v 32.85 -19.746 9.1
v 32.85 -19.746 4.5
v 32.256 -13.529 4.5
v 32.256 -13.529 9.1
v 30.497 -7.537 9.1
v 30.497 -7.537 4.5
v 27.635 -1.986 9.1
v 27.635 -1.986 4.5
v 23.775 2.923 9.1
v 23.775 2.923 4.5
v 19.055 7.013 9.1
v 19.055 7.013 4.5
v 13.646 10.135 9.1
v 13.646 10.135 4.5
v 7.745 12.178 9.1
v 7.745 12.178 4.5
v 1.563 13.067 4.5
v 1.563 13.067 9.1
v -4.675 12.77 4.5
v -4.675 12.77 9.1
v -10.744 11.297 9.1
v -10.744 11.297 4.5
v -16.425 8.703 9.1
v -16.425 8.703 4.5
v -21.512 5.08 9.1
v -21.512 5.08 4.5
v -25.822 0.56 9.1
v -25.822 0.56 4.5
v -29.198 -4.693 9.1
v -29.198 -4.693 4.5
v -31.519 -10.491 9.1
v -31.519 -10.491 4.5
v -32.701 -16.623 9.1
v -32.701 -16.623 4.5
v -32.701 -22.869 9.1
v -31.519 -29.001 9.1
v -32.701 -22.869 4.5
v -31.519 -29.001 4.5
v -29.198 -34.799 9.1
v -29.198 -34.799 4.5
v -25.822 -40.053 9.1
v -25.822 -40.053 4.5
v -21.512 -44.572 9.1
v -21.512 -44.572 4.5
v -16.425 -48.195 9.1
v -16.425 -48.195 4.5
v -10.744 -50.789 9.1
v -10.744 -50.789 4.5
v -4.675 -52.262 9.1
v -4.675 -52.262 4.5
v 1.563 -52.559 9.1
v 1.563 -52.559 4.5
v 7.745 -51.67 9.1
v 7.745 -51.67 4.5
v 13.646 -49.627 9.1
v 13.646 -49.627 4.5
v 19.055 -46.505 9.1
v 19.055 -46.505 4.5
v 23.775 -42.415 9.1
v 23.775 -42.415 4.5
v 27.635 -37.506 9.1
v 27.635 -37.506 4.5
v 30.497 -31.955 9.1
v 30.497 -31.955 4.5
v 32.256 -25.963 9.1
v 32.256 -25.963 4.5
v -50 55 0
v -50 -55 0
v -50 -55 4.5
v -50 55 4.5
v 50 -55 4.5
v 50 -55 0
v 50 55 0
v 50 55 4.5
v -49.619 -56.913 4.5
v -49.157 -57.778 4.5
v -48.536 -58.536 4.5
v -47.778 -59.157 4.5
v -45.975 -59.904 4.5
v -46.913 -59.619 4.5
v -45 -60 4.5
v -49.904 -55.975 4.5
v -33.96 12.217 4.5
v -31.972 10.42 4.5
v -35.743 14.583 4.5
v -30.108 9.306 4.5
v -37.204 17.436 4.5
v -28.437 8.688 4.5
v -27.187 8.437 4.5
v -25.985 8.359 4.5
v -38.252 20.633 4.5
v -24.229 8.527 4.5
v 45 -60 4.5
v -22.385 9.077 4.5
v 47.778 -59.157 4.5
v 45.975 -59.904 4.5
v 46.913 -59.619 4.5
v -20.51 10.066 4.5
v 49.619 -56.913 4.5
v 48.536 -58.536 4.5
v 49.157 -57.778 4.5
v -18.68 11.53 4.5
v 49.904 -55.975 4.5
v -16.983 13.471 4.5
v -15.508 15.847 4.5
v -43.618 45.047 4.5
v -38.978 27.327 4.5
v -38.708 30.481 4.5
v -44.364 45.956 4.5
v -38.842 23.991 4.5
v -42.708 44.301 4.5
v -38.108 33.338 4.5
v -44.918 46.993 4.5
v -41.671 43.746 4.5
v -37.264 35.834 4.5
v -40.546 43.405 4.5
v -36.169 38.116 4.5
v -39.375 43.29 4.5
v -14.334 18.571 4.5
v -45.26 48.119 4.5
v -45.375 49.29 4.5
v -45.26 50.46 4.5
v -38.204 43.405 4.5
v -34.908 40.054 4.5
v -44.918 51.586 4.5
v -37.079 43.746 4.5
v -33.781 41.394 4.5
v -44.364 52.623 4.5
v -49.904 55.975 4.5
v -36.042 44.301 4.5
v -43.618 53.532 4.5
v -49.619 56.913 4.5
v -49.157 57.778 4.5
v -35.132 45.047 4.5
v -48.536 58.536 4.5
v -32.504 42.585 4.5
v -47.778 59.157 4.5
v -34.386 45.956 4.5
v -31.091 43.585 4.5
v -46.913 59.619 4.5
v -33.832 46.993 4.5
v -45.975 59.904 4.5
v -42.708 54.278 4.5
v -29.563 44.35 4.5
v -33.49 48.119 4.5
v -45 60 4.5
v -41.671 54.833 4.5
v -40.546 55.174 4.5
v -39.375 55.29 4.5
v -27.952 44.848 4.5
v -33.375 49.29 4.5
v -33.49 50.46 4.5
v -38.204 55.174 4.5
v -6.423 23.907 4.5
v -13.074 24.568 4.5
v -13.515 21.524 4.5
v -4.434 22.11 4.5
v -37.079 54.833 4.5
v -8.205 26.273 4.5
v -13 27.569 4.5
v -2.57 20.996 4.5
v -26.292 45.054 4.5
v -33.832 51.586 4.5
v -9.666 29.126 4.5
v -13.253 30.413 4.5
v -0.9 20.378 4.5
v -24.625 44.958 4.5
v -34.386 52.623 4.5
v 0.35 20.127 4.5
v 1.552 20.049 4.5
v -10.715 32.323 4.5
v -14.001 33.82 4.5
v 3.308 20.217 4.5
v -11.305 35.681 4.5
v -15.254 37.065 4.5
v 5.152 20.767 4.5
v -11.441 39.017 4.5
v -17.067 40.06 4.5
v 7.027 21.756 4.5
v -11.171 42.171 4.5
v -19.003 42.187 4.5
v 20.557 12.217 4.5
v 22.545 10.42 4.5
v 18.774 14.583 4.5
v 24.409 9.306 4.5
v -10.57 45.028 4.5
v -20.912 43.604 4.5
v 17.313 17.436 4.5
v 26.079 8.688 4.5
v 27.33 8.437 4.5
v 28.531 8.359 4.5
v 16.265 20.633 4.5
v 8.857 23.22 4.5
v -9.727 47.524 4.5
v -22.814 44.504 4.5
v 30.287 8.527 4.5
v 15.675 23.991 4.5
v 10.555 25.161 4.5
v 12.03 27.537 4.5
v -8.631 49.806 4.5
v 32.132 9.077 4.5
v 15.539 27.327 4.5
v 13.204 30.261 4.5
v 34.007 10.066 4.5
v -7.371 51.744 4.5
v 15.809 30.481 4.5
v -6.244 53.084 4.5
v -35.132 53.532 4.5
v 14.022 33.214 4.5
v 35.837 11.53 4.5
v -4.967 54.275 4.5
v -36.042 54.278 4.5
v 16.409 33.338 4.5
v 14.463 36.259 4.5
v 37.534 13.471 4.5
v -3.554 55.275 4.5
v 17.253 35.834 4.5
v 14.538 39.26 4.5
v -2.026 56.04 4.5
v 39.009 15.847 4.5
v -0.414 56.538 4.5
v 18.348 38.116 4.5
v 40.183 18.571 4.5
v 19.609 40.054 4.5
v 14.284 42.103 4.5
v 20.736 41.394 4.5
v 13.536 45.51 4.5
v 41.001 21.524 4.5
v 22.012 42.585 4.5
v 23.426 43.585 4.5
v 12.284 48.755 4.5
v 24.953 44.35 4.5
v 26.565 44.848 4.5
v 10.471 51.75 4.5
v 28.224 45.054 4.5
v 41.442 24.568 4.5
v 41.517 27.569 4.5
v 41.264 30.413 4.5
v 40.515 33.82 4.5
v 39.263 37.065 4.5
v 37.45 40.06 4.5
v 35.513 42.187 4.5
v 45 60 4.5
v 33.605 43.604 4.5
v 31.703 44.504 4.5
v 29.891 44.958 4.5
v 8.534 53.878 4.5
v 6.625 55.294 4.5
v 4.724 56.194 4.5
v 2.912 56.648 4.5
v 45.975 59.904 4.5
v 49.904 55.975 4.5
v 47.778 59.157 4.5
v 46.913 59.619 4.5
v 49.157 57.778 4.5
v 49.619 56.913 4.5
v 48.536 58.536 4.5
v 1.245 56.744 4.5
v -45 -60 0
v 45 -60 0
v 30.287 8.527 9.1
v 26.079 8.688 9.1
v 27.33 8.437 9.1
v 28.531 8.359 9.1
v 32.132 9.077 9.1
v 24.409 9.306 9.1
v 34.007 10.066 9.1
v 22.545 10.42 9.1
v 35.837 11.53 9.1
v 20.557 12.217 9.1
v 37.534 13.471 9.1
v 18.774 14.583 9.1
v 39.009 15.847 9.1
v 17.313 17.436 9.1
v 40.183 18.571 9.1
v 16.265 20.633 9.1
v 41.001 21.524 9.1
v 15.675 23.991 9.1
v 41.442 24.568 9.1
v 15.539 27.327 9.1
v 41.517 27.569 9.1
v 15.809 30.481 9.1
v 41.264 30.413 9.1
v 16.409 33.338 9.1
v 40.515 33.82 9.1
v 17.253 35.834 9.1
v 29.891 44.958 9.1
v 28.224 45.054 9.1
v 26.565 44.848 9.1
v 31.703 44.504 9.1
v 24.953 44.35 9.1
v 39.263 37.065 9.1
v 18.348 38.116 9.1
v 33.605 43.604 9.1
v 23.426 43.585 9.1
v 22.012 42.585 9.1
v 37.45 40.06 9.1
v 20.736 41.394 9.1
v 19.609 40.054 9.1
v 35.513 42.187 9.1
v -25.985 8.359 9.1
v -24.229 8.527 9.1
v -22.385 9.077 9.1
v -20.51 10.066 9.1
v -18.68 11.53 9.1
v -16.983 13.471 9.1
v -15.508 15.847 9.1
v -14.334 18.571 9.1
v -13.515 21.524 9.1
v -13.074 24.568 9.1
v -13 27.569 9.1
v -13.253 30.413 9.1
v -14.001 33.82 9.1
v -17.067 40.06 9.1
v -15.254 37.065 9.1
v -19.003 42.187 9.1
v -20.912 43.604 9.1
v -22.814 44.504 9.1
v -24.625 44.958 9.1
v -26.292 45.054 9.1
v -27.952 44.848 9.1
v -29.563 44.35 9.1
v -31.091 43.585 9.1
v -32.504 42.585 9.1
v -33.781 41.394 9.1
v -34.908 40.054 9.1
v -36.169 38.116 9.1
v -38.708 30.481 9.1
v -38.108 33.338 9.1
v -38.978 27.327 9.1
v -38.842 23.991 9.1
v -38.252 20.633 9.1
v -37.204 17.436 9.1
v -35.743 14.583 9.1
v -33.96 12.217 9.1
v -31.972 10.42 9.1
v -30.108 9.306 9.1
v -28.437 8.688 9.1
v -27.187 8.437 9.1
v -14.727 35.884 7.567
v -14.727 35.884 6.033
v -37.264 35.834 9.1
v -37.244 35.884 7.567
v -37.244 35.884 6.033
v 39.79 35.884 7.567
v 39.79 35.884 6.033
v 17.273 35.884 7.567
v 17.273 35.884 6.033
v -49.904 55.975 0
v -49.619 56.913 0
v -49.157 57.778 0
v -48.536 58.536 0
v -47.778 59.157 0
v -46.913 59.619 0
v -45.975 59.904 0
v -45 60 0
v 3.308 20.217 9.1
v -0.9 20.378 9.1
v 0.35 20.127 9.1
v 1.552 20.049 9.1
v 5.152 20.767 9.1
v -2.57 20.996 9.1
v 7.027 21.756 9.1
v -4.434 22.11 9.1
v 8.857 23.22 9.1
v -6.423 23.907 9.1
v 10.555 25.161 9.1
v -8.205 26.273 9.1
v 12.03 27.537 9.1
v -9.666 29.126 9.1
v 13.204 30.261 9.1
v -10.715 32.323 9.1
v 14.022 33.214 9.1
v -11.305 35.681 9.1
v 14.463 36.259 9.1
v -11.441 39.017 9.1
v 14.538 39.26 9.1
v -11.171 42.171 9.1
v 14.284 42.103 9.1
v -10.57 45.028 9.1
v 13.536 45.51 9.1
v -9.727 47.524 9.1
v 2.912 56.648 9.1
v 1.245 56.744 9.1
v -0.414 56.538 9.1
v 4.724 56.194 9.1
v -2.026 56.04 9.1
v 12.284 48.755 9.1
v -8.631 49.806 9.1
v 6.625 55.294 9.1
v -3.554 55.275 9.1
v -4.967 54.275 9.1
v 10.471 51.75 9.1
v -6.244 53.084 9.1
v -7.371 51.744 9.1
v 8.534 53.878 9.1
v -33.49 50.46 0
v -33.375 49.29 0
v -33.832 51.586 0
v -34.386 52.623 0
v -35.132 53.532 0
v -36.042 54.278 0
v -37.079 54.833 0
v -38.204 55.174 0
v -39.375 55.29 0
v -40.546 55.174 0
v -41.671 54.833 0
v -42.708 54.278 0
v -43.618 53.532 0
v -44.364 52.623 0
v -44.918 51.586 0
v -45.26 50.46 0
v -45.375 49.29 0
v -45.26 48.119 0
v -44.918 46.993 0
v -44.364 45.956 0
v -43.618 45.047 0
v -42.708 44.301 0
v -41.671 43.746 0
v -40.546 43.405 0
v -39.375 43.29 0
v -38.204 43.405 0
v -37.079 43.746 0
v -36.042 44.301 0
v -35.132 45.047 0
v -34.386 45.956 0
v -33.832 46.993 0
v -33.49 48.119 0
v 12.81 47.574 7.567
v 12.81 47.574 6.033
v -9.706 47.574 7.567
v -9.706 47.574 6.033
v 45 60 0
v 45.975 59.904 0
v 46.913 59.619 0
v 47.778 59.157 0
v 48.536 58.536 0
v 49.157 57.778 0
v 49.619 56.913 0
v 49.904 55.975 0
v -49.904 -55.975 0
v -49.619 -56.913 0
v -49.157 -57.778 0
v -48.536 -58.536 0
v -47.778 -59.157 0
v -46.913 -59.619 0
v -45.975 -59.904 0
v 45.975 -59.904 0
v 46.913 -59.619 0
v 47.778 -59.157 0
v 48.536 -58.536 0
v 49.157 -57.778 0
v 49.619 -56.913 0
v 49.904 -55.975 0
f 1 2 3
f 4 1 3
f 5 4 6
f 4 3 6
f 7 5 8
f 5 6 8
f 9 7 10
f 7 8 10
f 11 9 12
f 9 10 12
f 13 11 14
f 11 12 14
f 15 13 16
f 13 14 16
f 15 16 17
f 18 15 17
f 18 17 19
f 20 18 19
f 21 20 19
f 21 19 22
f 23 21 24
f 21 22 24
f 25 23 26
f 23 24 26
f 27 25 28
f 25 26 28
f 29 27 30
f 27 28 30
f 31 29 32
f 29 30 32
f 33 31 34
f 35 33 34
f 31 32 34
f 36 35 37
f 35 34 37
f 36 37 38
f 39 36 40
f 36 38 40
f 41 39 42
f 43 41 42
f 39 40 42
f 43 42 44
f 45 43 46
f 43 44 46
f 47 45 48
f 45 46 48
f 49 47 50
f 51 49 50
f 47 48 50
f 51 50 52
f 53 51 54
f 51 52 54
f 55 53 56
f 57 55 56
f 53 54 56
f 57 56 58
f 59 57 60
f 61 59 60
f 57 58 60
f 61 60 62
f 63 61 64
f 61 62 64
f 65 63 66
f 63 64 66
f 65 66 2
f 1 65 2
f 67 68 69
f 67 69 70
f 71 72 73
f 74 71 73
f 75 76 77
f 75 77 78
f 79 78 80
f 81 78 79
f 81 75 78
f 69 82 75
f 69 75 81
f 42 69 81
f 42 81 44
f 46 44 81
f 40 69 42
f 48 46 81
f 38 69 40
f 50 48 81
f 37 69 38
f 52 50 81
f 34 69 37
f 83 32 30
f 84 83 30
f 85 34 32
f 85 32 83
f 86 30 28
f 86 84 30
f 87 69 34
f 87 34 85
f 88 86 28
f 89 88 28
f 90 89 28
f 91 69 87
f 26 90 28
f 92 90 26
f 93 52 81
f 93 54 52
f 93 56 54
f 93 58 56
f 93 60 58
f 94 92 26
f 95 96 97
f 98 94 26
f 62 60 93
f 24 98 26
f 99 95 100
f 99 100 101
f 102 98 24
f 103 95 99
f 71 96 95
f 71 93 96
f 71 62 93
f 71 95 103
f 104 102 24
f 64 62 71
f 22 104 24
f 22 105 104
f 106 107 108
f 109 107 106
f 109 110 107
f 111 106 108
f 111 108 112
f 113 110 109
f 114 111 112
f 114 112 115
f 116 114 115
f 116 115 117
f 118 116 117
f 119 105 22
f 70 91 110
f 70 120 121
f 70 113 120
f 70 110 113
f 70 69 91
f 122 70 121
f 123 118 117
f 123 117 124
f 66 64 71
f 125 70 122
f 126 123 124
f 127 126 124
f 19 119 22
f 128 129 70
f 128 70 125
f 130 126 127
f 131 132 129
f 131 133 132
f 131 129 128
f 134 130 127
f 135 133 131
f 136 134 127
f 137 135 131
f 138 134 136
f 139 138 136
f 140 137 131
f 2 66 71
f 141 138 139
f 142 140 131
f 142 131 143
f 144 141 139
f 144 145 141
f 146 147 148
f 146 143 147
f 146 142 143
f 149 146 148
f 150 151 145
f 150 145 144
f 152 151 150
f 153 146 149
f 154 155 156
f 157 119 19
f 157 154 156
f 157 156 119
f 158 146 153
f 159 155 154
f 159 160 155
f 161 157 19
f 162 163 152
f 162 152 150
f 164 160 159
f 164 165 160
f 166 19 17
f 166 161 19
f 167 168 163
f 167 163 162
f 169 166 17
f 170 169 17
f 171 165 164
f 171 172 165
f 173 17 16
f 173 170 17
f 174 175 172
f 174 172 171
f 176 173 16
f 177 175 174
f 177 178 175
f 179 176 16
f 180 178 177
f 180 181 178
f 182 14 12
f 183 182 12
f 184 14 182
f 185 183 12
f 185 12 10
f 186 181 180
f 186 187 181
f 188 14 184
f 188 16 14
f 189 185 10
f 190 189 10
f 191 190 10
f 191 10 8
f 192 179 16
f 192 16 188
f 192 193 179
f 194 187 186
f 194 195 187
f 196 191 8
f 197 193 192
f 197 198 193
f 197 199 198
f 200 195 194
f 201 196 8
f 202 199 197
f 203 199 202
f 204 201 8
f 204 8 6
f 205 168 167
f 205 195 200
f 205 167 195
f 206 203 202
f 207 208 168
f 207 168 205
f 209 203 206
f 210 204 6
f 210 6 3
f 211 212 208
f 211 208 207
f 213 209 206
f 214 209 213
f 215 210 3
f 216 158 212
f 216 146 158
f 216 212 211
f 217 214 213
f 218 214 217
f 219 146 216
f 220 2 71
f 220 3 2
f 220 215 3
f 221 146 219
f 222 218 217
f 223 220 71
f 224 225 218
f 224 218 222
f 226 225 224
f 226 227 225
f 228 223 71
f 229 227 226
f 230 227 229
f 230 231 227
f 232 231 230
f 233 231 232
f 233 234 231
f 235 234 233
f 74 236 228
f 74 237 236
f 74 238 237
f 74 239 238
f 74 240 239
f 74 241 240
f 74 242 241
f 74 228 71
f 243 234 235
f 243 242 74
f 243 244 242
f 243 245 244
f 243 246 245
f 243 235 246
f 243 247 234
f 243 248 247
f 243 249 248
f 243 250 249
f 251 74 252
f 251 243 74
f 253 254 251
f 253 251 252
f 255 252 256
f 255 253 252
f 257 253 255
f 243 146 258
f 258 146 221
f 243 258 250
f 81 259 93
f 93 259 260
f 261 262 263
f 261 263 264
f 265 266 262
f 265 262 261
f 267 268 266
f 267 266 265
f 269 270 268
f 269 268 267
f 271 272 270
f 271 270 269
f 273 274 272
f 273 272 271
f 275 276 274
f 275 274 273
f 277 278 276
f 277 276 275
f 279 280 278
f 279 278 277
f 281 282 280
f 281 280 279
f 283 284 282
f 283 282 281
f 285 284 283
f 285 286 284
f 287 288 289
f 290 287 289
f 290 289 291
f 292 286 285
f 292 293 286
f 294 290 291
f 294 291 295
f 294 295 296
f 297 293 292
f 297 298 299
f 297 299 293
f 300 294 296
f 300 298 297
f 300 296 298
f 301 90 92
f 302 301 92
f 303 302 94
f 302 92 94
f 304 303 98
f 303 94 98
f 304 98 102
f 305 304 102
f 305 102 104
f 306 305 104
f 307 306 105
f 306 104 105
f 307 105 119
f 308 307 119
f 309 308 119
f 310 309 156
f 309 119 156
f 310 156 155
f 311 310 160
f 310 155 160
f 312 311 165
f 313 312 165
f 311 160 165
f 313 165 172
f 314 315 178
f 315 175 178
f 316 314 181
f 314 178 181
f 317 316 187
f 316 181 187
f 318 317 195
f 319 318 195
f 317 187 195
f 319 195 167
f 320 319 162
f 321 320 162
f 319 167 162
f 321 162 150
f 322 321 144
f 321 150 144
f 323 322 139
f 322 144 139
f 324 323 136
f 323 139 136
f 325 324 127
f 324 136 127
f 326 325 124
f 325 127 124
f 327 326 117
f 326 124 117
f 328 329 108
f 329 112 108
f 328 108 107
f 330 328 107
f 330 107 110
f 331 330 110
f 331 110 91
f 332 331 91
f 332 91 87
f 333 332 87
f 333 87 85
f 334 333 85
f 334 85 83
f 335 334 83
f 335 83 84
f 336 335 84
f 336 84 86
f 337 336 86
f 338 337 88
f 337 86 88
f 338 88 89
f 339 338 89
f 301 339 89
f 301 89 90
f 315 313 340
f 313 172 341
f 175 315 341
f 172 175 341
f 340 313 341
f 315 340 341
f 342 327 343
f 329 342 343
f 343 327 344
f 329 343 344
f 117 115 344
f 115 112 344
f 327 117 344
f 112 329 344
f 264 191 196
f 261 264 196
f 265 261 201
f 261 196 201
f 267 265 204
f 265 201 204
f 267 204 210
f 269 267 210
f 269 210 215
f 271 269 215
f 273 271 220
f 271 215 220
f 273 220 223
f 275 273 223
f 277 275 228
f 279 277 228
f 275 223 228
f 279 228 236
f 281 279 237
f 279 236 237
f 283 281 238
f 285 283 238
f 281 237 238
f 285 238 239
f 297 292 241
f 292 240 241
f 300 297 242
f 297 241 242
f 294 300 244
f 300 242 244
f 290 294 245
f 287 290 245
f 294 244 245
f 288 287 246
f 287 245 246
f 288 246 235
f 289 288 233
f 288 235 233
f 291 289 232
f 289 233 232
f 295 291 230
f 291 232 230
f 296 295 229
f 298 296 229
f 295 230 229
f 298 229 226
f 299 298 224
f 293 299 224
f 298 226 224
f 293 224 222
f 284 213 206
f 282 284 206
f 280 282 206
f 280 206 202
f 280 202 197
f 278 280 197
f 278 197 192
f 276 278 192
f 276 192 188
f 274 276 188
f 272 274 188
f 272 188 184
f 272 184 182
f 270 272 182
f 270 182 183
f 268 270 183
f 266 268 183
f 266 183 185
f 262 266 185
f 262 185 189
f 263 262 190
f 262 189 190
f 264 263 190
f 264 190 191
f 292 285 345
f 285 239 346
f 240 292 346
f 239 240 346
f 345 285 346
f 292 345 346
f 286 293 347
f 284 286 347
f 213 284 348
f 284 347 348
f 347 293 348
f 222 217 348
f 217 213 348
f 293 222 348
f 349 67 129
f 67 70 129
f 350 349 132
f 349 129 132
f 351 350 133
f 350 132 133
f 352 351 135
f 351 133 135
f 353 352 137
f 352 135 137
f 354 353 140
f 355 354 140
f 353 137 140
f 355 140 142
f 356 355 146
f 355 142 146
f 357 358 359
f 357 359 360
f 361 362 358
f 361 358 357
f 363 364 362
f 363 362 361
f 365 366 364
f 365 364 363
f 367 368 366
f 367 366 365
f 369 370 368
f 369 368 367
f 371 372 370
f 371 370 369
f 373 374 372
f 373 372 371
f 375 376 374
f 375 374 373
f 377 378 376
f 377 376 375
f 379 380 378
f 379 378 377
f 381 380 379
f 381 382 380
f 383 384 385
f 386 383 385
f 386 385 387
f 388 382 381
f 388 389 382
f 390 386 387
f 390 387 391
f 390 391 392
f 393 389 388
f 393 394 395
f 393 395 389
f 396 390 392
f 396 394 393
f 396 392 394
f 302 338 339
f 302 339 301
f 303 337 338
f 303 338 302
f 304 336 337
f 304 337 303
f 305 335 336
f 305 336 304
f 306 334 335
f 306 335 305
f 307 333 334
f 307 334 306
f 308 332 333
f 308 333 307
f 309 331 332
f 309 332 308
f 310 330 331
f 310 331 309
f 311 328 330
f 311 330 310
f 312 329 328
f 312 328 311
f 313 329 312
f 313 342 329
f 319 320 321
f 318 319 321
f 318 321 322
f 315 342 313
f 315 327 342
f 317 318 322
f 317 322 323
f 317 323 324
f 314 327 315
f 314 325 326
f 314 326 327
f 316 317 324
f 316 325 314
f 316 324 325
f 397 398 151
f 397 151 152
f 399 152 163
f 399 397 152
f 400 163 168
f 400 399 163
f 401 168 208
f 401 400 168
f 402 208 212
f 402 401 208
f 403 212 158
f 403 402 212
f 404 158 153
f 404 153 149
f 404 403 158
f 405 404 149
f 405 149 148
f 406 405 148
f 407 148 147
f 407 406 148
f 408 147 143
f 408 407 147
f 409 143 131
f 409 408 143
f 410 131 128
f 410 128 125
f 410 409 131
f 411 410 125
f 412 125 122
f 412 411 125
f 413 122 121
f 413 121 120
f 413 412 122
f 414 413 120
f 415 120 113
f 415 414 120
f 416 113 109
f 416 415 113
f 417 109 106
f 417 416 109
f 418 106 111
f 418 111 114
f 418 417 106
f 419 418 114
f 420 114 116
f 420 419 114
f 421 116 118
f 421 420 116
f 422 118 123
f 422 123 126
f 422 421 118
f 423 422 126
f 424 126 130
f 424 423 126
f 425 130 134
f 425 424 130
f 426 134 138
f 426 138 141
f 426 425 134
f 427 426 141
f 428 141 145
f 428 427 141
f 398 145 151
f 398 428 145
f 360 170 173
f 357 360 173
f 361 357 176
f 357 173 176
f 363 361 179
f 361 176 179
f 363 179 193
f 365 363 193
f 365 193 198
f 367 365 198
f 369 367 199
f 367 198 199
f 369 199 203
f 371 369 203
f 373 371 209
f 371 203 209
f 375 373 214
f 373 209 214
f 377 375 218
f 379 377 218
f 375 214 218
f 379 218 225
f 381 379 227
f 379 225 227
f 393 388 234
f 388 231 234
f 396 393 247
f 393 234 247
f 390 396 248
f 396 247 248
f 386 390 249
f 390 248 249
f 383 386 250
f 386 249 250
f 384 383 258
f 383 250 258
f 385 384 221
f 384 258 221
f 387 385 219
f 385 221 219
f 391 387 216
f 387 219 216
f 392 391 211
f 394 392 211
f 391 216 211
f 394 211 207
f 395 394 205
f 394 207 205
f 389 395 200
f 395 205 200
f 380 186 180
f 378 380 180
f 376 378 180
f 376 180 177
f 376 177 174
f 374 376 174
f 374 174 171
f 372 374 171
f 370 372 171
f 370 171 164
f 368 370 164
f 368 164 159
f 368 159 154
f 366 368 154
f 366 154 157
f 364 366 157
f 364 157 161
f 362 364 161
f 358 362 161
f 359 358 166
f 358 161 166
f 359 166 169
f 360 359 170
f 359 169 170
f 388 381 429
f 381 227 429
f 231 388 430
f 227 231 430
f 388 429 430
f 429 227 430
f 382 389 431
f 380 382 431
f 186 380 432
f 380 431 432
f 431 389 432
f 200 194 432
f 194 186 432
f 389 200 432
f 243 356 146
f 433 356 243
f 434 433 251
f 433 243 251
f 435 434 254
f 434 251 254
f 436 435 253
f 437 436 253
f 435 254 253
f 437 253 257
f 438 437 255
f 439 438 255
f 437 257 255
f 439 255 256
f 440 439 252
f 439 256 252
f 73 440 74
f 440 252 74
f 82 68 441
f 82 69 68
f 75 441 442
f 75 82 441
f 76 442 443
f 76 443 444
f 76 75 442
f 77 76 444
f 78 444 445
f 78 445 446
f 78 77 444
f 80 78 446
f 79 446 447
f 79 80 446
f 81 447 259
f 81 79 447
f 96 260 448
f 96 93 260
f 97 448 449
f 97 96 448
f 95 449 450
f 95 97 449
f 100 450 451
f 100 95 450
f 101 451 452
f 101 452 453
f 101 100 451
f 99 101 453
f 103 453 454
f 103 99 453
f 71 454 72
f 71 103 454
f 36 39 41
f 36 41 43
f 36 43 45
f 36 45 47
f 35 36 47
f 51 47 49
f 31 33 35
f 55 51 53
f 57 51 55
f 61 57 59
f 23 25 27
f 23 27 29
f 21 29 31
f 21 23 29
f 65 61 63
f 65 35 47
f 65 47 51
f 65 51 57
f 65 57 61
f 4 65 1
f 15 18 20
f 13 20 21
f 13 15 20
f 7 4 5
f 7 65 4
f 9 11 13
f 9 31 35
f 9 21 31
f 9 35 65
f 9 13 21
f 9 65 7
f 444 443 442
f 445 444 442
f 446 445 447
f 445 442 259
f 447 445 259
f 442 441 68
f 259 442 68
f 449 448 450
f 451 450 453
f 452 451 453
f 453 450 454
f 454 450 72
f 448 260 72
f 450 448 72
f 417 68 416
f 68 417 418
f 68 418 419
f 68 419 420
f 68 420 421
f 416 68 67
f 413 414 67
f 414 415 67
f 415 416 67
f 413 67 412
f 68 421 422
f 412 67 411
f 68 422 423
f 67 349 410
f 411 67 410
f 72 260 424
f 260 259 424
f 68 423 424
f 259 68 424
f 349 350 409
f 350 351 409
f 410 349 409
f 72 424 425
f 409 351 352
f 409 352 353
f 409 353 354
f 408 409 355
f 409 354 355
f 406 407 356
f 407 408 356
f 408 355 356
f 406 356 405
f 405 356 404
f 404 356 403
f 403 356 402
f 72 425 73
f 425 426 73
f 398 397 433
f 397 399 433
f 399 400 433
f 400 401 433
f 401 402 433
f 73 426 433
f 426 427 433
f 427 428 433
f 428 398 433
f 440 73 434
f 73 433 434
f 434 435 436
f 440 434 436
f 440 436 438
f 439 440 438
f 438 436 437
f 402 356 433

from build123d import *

# Parameters (mm, degrees)
F0_W     = 100
F0_H     = 120
F0_R     = 6
F1_DEPTH = 4.5
F2_R     = 5
F3_R     = 32.85
F4_DEPTH = 4.6


with BuildPart() as f1:
    # F0 (on Top) → F1 (new body)
    with BuildSketch(Plane.XY):
        Rectangle(F0_W, F0_H)
        with Locations((-39.375003, 49.289569)):
            Circle(F0_R, mode=Mode.SUBTRACT)
    extrude(amount=F1_DEPTH)

    # F2
    f2_edges = [f1.edges().sort_by_distance(p)[0] for p in [
        (-50, -60, 2.25),
        (50, -60, 2.25),
        (50, 60, 2.25),
        (-50, 60, 2.25),
    ]]
    fillet(f2_edges, radius=F2_R)

    # F3 (on face) → F4 (join)
    with BuildSketch(Plane.XY.offset(4.5)):
        with Locations((0, -19.746054)):
            Circle(F3_R)
        with BuildLine():
            add(Edge.make_bspline(
                [(-25.985471, 8.35891), (-3.46881, 8.35891), (-14.72714, 35.88391), (-25.985471, 63.40891), (-37.243801, 35.88391), (-48.502131, 8.35891), (-25.985471, 8.35891)],
                knots=[0, 0, 0, 2.094395, 2.094395, 4.18879, 4.18879, 6.283185, 6.283185, 6.283185], degree=2, weights=[1, 0.5, 1, 0.5, 1, 0.5, 1]))
        make_face()
        with BuildLine():
            add(Edge.make_bspline(
                [(1.551867, 20.048938), (24.068527, 20.048938), (12.810197, 47.573938), (1.551867, 75.098938), (-9.706464, 47.573938), (-20.964794, 20.048938), (1.551867, 20.048938)],
                knots=[0, 0, 0, 2.094395, 2.094395, 4.18879, 4.18879, 6.283185, 6.283185, 6.283185], degree=2, weights=[1, 0.5, 1, 0.5, 1, 0.5, 1]))
        make_face()
        with BuildLine():
            add(Edge.make_bspline(
                [(28.531192, 8.35891), (51.047852, 8.35891), (39.789522, 35.88391), (28.531192, 63.40891), (17.272861, 35.88391), (6.014531, 8.35891), (28.531192, 8.35891)],
                knots=[0, 0, 0, 2.094395, 2.094395, 4.18879, 4.18879, 6.283185, 6.283185, 6.283185], degree=2, weights=[1, 0.5, 1, 0.5, 1, 0.5, 1]))
        make_face()
    extrude(amount=F4_DEPTH)


solid = f1.part
